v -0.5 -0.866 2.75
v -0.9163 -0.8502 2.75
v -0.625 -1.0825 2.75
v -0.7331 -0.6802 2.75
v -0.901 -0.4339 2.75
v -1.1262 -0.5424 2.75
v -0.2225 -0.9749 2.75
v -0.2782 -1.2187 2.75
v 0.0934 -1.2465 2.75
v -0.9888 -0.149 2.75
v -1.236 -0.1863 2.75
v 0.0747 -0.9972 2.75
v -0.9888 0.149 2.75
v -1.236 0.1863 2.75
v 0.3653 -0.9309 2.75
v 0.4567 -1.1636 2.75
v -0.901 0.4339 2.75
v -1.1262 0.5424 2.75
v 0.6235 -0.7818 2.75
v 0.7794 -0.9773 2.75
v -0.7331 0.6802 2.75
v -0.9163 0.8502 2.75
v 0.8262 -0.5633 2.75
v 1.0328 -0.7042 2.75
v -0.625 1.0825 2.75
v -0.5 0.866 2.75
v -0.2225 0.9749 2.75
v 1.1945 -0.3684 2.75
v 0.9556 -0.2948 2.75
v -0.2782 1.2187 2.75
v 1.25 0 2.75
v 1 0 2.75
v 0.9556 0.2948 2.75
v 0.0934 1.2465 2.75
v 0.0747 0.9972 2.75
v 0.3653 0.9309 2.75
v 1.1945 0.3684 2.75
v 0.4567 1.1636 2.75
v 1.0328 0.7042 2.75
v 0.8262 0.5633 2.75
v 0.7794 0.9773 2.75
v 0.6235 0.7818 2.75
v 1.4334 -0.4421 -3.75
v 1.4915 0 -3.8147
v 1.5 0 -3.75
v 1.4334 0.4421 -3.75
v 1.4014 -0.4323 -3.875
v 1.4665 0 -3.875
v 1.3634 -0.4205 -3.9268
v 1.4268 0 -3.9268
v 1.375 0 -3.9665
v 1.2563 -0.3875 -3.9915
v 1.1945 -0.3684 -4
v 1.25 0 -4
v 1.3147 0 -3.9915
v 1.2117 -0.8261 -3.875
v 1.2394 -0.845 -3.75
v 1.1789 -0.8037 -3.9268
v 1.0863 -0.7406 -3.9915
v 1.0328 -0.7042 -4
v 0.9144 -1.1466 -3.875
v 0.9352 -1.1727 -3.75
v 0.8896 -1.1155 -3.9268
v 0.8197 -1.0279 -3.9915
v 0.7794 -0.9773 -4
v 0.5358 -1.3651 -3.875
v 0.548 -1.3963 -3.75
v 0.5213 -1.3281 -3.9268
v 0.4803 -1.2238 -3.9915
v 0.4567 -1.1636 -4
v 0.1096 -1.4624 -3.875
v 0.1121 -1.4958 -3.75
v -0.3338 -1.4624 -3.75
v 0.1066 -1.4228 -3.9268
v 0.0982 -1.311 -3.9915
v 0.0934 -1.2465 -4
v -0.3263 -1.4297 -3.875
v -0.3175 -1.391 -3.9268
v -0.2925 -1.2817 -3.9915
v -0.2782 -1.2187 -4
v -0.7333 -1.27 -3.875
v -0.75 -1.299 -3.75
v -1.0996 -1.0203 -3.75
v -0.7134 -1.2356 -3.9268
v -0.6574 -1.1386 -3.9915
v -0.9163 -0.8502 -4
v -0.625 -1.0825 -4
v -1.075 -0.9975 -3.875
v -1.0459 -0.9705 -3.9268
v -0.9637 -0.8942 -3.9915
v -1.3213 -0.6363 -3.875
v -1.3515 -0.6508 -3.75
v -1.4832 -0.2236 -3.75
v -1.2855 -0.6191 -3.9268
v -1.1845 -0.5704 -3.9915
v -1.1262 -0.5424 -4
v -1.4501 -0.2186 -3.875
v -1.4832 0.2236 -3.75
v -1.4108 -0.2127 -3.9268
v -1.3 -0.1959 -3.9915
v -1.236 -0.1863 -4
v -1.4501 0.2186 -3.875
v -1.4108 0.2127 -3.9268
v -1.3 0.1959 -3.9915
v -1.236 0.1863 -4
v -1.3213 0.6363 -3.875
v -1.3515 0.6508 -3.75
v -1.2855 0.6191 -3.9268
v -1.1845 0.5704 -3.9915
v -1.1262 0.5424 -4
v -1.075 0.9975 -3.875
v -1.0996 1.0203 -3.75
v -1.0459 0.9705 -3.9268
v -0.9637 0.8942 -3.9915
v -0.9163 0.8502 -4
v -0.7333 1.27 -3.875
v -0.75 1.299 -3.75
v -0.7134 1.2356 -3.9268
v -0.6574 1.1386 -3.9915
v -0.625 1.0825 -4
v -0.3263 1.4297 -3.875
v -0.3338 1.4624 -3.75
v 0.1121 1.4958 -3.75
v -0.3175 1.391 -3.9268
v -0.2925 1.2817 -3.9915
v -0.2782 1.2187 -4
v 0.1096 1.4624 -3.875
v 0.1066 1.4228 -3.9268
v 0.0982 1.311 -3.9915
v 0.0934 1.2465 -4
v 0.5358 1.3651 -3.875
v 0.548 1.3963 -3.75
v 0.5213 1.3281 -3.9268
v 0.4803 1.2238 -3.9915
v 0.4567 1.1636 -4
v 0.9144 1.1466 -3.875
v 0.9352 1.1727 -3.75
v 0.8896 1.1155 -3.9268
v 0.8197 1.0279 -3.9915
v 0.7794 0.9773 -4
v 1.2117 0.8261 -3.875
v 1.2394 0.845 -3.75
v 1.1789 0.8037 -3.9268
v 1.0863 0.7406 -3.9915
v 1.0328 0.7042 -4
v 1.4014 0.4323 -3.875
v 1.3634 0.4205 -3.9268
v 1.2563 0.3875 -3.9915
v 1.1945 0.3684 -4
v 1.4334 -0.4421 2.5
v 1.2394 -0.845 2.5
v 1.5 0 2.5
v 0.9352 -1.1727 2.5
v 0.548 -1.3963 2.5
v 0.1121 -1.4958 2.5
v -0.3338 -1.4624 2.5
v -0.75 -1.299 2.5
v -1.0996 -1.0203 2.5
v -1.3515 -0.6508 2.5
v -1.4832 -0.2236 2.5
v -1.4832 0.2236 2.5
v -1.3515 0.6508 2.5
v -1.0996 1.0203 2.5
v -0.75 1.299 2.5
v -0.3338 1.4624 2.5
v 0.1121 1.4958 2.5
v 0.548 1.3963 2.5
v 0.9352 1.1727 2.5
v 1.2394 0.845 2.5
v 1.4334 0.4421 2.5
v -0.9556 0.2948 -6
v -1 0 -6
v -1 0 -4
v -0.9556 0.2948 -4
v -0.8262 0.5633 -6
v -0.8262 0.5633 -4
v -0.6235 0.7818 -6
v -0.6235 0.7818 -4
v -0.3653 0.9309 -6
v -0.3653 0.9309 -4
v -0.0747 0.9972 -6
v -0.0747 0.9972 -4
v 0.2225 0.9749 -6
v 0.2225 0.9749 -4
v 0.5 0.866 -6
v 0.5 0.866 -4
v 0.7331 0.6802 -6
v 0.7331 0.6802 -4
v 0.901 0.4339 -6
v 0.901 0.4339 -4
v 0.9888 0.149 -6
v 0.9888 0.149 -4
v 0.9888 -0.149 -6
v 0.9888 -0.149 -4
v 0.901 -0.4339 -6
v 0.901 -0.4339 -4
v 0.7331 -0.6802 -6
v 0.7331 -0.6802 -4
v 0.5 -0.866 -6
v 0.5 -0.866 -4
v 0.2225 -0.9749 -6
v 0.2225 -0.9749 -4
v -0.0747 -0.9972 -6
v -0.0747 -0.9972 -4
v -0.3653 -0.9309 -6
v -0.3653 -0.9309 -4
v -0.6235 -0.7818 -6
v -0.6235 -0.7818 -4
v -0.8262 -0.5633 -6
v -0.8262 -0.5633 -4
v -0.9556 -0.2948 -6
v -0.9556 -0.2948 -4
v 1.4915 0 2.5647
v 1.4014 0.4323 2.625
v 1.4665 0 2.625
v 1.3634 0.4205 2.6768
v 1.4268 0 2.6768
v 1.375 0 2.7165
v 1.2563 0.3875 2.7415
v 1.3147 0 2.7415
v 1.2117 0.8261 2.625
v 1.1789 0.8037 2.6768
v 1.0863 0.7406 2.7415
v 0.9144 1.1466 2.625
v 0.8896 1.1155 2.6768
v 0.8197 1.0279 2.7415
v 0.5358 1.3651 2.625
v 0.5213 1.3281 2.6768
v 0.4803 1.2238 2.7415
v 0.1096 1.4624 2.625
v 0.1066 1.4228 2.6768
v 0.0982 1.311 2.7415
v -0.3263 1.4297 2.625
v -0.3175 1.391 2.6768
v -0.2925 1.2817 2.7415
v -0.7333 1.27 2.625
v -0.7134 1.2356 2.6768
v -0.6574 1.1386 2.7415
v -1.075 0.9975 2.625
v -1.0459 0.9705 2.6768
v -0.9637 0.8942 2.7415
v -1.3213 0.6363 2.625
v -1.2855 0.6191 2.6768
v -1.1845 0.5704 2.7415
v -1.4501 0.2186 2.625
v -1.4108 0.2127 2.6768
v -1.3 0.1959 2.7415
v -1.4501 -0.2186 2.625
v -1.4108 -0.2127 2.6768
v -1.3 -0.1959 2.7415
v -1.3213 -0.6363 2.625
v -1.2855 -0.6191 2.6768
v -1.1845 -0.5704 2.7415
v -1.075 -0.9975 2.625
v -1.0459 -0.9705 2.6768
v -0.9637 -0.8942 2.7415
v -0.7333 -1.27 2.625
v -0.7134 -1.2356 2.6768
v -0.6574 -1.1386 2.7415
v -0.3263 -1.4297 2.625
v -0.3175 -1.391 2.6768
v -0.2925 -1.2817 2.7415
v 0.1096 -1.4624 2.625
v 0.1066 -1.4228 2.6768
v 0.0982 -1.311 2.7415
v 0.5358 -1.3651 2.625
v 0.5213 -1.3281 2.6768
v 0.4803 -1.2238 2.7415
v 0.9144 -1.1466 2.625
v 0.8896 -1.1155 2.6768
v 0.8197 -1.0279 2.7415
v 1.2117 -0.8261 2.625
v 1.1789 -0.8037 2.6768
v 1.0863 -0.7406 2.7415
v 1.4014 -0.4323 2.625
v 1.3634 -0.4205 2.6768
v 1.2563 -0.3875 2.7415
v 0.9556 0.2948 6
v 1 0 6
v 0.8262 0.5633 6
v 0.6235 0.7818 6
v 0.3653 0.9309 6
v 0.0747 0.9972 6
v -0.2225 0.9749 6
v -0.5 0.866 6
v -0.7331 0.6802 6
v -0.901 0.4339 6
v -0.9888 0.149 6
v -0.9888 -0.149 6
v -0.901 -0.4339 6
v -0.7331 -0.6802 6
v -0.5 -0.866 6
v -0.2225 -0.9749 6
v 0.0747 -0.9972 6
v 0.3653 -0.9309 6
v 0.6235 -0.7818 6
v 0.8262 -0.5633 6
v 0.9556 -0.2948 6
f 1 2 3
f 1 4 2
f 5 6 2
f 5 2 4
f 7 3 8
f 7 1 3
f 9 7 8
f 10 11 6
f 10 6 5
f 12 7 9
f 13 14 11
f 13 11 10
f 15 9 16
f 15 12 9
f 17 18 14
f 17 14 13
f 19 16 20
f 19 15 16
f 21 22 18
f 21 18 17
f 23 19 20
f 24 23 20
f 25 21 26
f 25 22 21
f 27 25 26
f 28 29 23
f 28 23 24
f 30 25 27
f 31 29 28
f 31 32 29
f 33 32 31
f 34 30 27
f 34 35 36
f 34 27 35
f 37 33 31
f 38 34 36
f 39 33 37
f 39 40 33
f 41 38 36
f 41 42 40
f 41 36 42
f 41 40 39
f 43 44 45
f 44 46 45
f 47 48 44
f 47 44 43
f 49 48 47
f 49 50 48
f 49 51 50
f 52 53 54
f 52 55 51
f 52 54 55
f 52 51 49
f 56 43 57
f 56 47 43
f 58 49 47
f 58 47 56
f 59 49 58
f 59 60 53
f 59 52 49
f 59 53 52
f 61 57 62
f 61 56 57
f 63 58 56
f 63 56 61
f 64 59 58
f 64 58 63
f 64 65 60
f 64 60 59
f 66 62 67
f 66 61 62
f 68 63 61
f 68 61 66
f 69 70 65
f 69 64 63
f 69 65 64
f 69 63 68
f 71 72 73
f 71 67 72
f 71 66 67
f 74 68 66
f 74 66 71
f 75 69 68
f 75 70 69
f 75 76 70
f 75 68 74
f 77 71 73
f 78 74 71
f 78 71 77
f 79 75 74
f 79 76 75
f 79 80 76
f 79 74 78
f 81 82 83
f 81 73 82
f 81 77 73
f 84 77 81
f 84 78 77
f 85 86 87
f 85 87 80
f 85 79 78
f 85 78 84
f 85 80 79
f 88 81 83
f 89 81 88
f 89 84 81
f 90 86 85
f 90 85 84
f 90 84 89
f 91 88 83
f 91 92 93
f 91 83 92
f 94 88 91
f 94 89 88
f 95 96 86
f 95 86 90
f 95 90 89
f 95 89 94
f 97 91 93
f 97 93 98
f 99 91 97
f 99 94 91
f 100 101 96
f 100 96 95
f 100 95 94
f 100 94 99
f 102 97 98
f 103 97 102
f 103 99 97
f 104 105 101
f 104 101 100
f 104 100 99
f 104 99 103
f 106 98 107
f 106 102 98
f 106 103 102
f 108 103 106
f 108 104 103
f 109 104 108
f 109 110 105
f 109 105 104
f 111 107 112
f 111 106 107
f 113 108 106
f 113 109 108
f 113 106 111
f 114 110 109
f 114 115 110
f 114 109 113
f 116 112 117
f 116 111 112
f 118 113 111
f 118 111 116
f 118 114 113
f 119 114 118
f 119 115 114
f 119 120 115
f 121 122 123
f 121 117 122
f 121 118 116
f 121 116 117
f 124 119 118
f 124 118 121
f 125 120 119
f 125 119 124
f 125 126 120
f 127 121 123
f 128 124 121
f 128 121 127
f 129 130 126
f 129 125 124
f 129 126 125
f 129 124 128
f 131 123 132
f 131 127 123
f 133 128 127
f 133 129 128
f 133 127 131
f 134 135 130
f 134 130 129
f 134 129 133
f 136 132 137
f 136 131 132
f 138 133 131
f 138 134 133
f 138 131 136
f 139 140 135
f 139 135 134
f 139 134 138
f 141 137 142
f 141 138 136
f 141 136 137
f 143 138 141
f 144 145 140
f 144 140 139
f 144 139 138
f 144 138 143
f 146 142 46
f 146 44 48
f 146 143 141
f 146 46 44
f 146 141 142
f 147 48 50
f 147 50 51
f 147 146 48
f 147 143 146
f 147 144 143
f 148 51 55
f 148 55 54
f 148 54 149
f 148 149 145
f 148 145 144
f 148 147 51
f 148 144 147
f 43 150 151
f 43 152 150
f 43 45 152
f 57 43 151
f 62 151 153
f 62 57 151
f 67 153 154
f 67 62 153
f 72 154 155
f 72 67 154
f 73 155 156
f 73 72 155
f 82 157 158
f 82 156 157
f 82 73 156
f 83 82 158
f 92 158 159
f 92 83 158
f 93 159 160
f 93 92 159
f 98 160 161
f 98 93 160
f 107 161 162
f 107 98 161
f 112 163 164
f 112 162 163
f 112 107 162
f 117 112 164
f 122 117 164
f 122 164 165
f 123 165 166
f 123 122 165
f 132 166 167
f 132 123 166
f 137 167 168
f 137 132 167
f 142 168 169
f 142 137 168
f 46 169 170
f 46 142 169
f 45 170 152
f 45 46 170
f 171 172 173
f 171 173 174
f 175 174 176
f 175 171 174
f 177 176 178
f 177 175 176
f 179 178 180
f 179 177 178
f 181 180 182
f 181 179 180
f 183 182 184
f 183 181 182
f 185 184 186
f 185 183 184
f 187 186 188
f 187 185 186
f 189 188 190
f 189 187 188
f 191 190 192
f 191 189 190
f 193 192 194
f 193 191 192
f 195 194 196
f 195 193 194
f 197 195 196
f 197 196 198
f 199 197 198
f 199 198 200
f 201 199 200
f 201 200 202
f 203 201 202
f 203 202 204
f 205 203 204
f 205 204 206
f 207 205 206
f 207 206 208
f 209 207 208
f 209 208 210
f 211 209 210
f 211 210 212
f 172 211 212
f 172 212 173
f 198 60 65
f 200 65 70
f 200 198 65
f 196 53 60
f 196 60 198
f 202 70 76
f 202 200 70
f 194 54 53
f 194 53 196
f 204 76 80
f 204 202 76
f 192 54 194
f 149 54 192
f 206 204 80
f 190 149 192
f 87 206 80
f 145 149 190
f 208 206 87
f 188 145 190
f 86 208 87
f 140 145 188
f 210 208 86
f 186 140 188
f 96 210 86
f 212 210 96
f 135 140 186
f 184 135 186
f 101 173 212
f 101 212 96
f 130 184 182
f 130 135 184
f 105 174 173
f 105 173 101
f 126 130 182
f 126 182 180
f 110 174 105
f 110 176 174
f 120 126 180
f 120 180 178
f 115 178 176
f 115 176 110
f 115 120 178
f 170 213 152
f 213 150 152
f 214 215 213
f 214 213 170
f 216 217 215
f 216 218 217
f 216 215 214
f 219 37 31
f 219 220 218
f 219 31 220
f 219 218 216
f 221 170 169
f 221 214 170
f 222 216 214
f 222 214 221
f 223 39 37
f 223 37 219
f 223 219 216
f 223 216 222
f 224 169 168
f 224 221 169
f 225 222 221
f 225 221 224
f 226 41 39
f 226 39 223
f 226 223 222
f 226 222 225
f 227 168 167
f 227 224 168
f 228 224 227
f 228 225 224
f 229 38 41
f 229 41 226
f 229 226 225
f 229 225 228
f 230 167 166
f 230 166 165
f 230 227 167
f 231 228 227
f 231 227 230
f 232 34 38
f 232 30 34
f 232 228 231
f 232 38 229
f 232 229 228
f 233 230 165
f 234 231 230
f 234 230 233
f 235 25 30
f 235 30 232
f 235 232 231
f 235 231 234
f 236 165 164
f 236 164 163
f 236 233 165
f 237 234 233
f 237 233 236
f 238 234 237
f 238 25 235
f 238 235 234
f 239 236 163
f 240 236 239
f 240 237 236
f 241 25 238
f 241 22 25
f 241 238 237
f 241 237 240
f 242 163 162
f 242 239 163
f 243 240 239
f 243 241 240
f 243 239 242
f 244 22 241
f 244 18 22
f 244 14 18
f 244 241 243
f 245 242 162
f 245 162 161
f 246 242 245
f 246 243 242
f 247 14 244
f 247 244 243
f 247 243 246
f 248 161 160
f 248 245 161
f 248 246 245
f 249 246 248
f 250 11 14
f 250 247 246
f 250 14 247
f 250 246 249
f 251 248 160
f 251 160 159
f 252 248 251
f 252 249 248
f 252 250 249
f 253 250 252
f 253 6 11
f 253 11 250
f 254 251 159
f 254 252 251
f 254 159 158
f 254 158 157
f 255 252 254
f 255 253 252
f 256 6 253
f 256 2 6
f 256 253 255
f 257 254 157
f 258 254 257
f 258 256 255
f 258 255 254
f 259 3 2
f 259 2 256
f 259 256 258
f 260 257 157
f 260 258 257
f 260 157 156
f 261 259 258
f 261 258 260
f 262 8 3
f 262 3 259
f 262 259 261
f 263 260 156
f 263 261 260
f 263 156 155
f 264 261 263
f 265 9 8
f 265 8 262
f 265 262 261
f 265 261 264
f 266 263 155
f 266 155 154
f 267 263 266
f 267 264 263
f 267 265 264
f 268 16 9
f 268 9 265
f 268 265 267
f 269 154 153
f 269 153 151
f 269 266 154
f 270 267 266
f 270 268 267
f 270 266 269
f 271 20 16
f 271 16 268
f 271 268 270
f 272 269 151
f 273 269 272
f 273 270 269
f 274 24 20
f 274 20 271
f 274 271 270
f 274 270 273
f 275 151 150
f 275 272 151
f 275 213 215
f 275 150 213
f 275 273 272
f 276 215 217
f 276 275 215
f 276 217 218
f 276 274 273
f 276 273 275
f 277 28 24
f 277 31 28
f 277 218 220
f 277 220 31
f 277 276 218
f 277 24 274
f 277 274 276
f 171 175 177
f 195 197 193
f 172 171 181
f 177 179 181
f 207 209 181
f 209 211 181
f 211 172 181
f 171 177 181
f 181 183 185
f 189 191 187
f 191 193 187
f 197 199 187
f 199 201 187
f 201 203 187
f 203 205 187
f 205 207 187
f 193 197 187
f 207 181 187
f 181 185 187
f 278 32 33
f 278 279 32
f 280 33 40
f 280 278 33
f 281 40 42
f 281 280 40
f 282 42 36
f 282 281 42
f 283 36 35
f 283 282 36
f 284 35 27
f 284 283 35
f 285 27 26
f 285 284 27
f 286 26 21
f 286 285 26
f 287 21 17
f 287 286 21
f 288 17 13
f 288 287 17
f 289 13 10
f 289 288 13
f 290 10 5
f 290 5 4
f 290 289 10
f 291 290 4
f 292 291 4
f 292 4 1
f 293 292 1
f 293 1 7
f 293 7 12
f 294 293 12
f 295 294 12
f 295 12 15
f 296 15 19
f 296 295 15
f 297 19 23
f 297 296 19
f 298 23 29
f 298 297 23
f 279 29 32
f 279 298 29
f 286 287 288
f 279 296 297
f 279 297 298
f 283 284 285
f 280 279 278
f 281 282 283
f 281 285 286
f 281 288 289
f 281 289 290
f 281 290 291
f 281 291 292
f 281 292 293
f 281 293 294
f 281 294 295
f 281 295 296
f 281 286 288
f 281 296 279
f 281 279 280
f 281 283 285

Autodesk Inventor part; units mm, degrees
sketch "Skizze1" plane through (0, 0, 0) normal (0, 0, 1) x (1, 0, 0)
  circle A0 centre (0, 0) radius 1.5
  dimension "d0" = 3
extrude "Extrusion1" add sketch "Skizze1" along normal mid plane 12
sketch "Skizze2" plane through (0, 0, 6) normal (0, 0, 1) x (1, 0, 0)
  circle A0 centre (0, 0) radius 1
  circle A1 centre (0, 0) radius 1.5 projected
  dimension "d3" = 2
extrude "Extrusion2" cut sketch "Skizze2" against normal blind 3.25
thread "Gewinde2" size "M2x0.4" class "6g" standard "ANSI Metric M Profile" full length
fillet "Rundung1" radius 0.25 1 edges at (-1.5, 0, 2.75)
sketch "Skizze3" plane through (0, 0, -6) normal (0, 0, -1) x (-1, 0, 0)
  circle A0 centre (0, 0) radius 1
  circle A1 centre (0, 0) radius 1.5 projected
  dimension "d11" = 2
extrude "Extrusion3" cut sketch "Skizze3" against normal blind 2
thread "Gewinde3" size "M2x0.4" class "6g" standard "ANSI Metric M Profile" full length
fillet "Rundung2" radius 0.25 1 edges at (-1.5, 0, -4)
properties part number "SchleppstangeBefestigung"
